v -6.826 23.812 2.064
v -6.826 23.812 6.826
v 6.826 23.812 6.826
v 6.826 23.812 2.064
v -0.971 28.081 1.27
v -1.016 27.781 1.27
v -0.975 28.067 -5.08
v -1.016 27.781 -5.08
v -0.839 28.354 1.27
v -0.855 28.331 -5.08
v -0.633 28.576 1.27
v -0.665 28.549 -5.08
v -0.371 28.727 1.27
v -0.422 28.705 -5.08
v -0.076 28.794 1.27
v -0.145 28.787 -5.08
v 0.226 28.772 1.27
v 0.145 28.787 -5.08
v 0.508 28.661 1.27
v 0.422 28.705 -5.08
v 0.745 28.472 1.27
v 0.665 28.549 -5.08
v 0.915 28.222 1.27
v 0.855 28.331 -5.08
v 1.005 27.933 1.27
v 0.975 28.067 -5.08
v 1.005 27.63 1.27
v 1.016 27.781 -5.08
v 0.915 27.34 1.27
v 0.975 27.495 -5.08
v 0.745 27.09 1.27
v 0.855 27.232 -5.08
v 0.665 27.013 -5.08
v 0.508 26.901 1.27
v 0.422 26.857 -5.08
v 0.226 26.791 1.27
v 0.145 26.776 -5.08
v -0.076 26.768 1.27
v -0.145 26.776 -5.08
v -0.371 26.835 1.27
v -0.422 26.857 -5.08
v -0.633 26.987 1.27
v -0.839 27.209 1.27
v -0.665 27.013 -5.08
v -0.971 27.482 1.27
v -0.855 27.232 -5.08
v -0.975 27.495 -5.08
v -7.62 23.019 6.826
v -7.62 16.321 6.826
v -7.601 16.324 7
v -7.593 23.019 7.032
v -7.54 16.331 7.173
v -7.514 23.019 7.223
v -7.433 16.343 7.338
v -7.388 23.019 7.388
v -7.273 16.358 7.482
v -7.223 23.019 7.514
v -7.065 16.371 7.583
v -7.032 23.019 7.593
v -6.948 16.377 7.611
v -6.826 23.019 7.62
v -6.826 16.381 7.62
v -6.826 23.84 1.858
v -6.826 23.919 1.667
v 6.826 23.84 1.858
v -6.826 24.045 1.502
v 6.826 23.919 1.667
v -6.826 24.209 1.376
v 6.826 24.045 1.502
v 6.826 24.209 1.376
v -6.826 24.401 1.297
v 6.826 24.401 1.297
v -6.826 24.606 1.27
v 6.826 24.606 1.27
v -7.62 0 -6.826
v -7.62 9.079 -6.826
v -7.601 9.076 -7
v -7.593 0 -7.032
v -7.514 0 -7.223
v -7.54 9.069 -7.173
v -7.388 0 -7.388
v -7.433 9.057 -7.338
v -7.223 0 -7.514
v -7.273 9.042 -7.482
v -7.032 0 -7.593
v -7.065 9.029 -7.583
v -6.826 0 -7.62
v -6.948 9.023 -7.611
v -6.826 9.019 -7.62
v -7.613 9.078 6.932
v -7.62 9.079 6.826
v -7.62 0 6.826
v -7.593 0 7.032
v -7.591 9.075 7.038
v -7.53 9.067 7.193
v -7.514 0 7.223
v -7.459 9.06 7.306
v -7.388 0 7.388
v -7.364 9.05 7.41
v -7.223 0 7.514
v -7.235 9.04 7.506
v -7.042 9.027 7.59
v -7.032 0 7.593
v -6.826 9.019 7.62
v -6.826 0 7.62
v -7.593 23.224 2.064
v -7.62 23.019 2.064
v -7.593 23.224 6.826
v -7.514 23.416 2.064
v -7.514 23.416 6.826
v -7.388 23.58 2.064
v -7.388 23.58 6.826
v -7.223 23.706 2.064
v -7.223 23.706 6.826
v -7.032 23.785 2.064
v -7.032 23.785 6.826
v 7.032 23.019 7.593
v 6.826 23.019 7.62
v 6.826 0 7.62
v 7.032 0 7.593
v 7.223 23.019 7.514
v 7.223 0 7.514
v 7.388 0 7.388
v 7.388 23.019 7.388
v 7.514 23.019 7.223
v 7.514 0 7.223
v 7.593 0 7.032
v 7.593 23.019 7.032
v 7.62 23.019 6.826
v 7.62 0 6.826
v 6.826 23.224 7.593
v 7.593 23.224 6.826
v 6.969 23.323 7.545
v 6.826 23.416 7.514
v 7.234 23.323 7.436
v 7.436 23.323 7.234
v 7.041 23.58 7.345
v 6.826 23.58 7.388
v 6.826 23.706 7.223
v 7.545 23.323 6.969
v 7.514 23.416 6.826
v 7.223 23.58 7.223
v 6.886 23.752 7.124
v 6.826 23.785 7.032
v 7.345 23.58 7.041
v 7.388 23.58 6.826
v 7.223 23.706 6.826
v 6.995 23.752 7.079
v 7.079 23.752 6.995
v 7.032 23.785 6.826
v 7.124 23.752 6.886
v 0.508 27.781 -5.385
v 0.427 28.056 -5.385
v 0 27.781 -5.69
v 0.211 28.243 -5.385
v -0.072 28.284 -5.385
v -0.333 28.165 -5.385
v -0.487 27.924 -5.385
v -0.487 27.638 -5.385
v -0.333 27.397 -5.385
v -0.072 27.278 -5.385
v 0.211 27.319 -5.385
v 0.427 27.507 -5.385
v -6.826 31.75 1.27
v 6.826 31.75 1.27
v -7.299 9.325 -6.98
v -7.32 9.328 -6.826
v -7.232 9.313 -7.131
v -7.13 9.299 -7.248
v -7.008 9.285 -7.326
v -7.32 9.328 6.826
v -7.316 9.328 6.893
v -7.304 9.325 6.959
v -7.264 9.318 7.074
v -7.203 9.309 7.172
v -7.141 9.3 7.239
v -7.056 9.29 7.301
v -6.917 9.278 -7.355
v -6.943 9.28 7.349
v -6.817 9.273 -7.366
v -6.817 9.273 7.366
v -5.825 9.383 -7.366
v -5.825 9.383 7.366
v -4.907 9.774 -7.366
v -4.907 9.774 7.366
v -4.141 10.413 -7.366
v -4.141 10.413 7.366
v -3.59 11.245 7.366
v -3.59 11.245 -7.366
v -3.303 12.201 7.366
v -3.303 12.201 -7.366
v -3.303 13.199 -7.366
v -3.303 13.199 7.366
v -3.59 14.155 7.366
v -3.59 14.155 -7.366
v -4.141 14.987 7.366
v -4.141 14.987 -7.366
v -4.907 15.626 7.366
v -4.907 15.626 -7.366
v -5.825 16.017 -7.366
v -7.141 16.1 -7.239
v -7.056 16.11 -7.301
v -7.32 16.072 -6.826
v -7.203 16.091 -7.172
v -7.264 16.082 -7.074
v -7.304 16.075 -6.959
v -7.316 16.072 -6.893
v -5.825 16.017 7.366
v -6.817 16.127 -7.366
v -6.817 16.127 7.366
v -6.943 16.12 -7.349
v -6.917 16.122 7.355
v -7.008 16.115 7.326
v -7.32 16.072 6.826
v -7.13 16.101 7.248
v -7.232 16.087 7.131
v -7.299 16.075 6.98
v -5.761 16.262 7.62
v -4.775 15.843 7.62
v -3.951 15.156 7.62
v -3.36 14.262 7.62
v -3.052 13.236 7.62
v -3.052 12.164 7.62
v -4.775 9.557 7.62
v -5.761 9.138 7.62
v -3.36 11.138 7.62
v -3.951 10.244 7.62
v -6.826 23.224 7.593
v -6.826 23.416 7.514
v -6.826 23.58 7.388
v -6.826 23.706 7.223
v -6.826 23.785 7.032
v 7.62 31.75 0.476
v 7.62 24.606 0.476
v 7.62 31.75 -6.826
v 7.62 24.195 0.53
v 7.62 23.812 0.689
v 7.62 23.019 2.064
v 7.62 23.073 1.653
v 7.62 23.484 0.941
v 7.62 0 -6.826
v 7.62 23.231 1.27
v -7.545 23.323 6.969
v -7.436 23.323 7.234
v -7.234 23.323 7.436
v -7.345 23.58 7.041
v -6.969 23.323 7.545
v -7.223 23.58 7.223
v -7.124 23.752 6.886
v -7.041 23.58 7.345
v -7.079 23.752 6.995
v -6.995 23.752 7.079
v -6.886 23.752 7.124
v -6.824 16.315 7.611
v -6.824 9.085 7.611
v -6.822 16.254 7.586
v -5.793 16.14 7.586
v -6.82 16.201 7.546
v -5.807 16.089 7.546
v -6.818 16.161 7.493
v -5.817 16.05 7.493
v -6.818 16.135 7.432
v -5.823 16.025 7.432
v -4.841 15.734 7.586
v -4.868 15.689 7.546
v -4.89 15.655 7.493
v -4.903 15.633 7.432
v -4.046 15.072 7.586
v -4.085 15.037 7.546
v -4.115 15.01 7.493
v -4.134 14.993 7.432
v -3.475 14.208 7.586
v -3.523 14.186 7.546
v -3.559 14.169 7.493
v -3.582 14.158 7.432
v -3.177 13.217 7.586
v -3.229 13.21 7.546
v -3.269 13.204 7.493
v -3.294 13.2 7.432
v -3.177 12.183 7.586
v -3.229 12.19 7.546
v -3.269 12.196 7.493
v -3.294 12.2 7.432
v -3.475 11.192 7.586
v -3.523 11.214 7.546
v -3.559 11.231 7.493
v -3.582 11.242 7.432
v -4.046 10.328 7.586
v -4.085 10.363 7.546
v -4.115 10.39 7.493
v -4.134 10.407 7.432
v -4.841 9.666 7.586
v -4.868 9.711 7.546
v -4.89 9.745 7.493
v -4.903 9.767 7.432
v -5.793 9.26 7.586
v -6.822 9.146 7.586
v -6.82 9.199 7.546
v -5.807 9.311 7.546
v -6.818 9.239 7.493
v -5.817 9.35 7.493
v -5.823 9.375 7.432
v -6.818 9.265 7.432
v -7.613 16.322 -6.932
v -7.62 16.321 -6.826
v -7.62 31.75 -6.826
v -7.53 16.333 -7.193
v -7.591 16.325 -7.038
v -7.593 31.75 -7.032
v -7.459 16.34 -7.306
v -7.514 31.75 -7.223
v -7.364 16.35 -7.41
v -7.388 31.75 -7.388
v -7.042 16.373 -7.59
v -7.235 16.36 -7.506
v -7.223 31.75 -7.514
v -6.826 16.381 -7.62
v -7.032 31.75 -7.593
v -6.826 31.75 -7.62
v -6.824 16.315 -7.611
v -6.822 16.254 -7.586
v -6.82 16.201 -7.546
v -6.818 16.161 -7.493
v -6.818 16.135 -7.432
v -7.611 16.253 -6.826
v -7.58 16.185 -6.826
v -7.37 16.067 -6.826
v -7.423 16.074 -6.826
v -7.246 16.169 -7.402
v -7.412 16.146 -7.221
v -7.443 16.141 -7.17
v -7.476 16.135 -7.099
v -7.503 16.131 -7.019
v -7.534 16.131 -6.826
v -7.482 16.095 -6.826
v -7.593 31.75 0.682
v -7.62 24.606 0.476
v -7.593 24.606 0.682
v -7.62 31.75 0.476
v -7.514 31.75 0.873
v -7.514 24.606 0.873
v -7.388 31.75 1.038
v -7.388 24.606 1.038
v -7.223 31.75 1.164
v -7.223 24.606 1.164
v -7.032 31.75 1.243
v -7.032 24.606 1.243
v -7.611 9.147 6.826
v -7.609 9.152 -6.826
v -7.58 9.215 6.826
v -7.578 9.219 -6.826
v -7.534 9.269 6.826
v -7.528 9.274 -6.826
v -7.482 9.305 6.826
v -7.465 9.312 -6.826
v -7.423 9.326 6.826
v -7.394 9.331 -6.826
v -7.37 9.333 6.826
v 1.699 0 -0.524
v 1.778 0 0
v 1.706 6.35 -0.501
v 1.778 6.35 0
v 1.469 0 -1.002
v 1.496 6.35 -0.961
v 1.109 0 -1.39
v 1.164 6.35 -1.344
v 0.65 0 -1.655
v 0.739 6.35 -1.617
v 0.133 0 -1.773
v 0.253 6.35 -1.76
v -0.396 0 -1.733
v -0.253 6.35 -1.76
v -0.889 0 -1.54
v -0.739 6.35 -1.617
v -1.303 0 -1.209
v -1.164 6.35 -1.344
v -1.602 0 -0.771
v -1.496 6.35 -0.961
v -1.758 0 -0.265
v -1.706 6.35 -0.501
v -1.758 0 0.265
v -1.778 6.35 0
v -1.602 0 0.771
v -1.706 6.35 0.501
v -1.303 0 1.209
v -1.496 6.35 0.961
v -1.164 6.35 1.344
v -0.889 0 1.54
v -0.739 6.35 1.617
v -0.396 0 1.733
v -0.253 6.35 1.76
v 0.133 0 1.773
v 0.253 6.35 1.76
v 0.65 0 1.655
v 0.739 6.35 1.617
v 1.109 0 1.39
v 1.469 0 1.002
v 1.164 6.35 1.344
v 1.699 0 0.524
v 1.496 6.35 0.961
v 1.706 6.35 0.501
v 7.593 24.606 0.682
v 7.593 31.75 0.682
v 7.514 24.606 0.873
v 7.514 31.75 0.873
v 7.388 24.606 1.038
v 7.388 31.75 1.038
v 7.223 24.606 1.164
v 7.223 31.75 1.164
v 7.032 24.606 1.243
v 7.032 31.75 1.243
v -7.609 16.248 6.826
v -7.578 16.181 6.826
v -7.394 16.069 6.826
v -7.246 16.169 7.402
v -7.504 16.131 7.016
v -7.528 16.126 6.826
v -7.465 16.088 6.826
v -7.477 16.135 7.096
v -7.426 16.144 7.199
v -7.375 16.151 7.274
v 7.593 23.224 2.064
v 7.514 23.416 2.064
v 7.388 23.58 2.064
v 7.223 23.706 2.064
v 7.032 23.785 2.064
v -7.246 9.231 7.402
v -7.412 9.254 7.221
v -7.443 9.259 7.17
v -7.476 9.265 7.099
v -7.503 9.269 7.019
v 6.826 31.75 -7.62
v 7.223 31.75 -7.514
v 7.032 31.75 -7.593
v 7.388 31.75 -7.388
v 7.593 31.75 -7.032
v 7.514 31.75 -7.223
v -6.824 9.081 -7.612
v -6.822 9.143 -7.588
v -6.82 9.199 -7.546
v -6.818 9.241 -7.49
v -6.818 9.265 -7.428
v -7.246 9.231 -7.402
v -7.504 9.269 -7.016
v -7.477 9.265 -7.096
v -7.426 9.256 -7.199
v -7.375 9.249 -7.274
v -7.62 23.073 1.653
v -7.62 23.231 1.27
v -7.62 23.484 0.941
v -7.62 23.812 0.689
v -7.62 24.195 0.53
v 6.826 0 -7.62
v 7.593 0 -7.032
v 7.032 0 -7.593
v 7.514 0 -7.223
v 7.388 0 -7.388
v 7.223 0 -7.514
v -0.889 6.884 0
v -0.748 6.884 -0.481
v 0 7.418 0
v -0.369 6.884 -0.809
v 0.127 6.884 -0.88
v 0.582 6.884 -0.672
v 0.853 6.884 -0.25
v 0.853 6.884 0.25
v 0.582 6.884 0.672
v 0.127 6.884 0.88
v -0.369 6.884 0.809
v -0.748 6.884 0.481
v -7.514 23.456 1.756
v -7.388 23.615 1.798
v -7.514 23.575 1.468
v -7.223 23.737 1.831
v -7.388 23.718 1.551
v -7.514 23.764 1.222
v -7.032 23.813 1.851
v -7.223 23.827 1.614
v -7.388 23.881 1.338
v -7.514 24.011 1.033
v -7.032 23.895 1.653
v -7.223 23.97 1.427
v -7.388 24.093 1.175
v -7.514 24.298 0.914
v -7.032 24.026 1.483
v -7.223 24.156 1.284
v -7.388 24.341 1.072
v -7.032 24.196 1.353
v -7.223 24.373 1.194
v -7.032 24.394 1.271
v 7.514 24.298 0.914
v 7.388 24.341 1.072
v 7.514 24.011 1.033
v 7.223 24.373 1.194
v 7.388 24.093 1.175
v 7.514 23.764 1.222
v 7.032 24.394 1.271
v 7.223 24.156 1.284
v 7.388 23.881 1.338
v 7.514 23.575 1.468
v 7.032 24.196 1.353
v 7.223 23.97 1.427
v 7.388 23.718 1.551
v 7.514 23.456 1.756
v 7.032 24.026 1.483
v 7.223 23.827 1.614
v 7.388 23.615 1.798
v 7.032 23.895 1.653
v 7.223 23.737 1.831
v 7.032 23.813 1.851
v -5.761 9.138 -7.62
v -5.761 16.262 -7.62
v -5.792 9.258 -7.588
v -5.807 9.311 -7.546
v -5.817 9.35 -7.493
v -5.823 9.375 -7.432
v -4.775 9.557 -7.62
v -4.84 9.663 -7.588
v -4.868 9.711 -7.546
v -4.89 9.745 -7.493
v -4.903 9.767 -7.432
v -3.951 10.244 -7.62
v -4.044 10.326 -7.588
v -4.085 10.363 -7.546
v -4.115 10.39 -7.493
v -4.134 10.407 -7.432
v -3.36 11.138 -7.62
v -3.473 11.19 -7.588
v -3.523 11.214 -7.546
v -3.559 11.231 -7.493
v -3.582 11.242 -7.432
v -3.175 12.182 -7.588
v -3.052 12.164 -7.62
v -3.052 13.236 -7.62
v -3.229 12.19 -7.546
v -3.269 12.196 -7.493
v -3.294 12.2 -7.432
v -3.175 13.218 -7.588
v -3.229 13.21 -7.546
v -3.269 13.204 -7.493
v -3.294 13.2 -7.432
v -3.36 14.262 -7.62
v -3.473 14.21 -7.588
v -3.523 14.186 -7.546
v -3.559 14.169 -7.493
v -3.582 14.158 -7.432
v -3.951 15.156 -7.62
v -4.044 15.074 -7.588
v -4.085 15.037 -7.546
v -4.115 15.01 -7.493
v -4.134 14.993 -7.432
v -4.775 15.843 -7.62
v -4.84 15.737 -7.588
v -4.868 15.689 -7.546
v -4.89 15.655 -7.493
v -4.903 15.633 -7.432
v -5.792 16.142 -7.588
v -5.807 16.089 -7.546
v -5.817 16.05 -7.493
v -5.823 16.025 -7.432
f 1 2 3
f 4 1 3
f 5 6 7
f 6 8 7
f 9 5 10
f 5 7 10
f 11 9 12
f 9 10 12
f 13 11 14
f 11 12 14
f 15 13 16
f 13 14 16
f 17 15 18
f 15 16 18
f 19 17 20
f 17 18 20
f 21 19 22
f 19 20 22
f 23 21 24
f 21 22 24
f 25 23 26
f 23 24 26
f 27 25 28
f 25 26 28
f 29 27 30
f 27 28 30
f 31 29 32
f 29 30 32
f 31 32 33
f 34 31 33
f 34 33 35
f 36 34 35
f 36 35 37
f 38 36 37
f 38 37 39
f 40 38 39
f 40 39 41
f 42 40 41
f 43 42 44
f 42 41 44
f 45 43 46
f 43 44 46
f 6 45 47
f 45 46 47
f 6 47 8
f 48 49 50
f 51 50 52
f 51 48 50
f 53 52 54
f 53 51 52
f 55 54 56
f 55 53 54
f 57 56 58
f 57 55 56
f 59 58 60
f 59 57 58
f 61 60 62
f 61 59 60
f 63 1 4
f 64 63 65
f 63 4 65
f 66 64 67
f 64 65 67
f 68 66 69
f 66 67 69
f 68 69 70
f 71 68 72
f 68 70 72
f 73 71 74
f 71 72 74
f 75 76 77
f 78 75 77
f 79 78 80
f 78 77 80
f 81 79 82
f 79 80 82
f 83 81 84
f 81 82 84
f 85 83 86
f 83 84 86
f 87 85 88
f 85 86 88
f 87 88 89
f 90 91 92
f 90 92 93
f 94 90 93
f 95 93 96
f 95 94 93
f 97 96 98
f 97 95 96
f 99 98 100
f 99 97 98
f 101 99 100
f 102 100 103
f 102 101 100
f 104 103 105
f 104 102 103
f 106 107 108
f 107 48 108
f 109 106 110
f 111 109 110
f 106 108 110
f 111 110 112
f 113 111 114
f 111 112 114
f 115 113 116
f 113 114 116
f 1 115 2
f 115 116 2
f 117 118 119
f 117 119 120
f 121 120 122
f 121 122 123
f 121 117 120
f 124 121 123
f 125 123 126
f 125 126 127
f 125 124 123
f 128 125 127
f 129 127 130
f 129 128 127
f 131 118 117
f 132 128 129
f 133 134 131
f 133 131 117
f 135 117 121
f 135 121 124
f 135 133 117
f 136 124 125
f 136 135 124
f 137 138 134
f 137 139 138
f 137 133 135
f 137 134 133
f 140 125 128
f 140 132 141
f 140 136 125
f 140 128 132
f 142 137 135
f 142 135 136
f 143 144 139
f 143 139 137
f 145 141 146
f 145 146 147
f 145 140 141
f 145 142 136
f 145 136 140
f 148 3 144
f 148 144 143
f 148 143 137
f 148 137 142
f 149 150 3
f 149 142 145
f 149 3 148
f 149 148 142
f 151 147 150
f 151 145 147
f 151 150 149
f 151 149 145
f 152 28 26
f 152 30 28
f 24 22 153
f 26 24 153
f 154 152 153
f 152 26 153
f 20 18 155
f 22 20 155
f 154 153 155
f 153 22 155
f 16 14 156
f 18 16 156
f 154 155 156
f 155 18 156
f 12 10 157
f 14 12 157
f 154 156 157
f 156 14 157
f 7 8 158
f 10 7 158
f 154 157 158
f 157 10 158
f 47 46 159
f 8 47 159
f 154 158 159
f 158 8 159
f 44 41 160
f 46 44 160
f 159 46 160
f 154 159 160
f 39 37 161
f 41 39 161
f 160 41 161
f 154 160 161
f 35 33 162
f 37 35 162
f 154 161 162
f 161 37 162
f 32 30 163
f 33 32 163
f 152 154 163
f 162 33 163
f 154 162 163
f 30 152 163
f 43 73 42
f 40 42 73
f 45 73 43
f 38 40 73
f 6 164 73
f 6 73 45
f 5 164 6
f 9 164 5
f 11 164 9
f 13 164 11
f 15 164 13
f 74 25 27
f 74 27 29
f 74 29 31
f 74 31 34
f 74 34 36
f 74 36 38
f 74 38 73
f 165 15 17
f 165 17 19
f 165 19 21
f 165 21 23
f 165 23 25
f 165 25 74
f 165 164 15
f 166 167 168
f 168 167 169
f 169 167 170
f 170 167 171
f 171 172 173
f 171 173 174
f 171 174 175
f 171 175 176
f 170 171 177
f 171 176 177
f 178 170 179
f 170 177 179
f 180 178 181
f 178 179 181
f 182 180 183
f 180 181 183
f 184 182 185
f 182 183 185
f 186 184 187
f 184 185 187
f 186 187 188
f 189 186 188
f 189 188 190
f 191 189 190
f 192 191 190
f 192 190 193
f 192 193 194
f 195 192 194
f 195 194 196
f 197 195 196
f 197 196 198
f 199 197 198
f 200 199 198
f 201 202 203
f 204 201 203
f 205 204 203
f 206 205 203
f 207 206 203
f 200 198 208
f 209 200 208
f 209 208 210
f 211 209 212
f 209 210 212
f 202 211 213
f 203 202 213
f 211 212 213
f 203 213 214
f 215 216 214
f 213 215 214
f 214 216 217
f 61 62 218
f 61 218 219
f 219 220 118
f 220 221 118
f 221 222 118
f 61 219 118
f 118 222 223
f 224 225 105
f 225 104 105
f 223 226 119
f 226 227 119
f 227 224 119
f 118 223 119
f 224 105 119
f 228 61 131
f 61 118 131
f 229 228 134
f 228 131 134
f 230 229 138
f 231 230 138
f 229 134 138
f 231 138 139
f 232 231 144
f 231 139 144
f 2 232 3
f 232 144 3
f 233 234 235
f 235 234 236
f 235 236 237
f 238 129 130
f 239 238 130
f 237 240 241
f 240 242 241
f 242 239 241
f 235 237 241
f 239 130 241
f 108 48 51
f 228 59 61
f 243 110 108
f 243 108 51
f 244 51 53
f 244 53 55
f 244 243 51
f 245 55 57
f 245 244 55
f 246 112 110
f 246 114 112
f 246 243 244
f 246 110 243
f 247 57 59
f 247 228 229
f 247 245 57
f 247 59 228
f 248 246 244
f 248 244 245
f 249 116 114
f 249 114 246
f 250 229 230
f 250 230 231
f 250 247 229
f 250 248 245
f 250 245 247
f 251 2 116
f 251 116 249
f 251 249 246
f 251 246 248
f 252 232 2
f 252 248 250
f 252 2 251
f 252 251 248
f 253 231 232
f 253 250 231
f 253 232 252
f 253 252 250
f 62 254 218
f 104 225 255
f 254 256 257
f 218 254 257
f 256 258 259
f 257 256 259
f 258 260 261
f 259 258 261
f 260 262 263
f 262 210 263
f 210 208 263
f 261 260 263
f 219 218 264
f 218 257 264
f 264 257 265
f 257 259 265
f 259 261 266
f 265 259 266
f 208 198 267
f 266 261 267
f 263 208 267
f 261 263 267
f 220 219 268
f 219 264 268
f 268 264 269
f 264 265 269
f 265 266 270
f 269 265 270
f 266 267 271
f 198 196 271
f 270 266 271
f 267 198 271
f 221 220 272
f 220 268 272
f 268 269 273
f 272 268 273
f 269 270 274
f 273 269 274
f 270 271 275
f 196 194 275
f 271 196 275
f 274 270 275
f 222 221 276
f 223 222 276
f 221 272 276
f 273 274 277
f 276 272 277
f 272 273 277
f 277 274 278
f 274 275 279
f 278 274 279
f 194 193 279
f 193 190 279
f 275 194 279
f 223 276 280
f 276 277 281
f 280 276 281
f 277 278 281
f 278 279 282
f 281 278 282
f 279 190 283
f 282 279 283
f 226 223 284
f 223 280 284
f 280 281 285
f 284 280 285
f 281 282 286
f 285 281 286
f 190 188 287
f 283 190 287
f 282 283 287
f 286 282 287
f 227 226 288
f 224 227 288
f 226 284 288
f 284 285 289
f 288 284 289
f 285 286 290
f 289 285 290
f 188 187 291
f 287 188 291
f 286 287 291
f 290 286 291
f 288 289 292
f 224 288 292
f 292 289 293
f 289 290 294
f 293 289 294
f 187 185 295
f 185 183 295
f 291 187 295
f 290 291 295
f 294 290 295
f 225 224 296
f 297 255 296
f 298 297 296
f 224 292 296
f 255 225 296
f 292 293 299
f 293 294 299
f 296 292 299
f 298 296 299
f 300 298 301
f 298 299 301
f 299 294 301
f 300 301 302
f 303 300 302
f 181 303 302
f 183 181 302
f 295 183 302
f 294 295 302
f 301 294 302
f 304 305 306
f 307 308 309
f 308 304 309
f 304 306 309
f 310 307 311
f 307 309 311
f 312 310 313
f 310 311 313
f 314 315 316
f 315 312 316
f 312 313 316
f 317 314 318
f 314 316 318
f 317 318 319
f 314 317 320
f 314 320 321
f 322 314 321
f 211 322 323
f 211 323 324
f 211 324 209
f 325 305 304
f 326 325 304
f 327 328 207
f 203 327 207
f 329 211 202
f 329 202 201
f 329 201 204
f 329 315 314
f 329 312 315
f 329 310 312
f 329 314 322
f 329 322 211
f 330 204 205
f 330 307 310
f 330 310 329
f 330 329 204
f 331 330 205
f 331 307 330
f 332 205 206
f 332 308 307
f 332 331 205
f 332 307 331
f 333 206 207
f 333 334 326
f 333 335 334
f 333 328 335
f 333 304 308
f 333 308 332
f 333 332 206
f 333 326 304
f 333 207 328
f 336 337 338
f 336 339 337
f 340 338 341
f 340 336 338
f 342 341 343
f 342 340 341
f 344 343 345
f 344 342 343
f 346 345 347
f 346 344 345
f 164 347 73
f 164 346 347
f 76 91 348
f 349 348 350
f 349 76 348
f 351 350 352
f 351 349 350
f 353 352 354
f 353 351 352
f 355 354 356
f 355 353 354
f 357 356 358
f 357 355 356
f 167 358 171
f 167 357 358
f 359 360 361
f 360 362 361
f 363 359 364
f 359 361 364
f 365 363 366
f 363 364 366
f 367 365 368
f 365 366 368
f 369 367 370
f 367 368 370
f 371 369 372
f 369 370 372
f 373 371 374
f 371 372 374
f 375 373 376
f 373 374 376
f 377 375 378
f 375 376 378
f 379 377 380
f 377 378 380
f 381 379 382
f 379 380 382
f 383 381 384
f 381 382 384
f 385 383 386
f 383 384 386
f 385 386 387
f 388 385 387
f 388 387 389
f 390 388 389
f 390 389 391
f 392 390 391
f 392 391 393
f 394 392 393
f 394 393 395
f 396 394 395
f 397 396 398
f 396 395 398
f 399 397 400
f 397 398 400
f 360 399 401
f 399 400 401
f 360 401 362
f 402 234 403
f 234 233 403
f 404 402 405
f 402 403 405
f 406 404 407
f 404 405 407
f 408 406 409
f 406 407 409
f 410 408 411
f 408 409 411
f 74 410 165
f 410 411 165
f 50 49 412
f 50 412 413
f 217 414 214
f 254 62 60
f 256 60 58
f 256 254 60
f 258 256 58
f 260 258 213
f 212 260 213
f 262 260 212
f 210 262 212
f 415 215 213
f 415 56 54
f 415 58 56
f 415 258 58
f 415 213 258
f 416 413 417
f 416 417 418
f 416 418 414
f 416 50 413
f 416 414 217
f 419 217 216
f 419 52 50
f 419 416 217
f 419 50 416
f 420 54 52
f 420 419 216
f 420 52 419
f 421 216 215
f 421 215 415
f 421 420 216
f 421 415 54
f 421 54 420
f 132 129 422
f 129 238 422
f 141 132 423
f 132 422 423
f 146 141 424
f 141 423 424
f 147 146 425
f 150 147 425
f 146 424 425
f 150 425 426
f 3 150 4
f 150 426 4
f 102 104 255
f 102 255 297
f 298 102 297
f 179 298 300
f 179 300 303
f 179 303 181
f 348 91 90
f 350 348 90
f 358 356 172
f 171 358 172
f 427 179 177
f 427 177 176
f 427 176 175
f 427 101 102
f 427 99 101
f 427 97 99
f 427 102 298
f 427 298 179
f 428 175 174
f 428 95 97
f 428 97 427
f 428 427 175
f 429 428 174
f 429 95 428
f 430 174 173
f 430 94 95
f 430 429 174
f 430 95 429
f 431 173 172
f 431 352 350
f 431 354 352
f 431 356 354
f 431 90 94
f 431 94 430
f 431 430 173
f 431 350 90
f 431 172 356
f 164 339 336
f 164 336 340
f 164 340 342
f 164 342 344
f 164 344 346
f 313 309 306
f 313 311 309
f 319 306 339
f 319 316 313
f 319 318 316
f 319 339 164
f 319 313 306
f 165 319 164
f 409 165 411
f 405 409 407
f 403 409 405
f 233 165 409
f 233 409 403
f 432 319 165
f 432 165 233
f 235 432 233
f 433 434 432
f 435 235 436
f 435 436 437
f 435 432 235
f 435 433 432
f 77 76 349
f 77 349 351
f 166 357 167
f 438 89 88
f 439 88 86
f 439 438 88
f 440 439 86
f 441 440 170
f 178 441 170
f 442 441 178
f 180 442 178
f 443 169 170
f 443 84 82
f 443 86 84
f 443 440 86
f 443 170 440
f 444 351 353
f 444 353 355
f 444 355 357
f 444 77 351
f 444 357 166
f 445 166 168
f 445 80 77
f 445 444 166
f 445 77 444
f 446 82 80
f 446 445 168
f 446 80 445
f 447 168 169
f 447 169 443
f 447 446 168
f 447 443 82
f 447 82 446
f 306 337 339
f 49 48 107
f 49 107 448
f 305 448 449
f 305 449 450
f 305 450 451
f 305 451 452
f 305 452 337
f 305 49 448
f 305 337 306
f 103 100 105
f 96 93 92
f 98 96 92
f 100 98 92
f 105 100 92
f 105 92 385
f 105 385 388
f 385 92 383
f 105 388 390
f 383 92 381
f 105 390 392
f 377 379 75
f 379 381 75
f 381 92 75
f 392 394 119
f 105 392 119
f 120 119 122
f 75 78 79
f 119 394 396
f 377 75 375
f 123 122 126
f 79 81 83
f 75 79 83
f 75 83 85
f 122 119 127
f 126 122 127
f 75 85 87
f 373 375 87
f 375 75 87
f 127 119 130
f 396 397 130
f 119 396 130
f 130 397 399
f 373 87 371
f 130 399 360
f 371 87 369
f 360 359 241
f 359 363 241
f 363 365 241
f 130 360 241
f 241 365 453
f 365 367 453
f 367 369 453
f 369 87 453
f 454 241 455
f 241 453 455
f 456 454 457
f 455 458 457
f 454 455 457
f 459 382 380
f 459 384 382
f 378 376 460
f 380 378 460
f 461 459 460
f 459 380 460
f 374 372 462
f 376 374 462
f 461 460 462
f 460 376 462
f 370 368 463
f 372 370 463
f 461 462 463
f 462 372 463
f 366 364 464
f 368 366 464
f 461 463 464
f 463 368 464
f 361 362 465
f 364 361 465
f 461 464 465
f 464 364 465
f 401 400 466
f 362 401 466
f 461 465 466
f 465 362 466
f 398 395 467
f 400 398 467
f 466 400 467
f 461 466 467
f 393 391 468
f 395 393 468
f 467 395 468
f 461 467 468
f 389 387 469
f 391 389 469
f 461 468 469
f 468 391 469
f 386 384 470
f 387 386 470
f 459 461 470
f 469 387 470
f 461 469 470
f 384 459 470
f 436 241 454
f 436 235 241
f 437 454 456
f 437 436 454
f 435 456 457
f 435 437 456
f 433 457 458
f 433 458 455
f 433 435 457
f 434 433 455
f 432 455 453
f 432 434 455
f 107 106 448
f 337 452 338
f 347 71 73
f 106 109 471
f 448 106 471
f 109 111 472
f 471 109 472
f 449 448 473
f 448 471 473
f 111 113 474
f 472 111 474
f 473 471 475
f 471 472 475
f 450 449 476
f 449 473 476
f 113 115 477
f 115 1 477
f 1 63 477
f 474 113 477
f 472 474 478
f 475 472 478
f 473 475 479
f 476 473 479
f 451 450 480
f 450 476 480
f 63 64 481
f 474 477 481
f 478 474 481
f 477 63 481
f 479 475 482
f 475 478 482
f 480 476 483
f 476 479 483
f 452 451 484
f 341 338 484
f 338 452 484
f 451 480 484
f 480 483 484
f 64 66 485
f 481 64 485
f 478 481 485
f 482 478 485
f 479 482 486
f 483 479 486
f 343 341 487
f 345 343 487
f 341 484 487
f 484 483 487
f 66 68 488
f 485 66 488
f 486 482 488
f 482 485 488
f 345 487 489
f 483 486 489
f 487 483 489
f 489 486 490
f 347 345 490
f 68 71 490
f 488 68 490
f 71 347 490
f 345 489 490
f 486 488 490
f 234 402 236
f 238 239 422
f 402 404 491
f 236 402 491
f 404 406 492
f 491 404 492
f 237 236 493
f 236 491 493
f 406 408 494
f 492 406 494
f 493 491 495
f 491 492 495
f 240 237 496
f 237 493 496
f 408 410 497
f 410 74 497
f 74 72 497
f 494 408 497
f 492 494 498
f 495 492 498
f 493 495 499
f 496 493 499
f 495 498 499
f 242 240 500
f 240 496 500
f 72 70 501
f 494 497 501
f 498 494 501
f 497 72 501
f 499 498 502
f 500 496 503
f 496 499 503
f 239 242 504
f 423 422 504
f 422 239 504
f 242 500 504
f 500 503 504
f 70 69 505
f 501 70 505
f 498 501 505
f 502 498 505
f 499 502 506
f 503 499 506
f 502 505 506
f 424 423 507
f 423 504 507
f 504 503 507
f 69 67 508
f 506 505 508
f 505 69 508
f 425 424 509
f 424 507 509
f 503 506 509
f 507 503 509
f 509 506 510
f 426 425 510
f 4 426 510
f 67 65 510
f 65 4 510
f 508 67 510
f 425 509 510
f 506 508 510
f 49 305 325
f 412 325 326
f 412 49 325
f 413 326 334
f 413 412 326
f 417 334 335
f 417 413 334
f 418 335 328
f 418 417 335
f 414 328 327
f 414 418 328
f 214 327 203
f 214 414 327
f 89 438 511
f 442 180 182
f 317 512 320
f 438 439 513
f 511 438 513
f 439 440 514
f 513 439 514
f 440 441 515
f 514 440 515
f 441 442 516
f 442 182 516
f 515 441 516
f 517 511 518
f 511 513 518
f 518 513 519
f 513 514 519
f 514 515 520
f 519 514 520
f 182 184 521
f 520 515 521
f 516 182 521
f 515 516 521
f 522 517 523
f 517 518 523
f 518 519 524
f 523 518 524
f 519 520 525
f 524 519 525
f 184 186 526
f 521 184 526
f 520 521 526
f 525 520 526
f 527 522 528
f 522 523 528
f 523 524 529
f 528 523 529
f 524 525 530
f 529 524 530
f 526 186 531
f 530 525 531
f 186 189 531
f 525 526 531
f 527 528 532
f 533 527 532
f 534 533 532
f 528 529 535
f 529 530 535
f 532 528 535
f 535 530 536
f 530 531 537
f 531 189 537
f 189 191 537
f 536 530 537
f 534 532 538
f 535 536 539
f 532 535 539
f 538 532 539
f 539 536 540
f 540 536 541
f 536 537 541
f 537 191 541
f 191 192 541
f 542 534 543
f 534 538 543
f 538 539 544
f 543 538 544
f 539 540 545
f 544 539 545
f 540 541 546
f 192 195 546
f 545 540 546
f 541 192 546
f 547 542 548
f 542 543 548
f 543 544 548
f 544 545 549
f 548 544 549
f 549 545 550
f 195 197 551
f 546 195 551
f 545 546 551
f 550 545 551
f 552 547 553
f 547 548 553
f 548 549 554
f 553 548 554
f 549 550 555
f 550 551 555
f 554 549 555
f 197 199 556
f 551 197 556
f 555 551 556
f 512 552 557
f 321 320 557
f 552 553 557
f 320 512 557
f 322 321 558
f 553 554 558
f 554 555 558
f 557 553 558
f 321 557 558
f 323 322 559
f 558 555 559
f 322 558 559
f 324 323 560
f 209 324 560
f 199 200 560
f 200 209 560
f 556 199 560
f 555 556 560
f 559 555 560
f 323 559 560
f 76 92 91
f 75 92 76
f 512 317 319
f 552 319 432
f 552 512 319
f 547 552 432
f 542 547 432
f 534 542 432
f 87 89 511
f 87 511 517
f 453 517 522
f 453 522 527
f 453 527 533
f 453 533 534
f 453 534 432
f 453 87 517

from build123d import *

# Parameters (mm, degrees)
SKETCH1_W                        = 15.24
SKETCH1_H                        = 15.24
BOSS_EXTRUDE1_DEPTH              = 31.75
FILLET1_R                        = 0.79375
CUT_EXTRUDE1_DEPTH               = 16.24
SKETCH2_3_W                      = 15.24
SKETCH2_3_H                      = 7.9375
CUT_EXTRUDE2_DEPTH               = 6.35
F_4_0_209_DIAMETER_HOLE1_D       = 2.032
F_4_0_209_DIAMETER_HOLE1_DEPTH   = 6.35
F_4_0_209_DIAMETER_HOLE1_TIP     = 0.610474389
F_10_0_1935_DIAMETER_HOLE1_D     = 3.556
F_10_0_1935_DIAMETER_HOLE1_DEPTH = 6.35
F_10_0_1935_DIAMETER_HOLE1_TIP   = 1.068330181
FILLET2_R                        = 0.79375
FILLET3_R                        = 0.254


with BuildPart() as part:
    # Sketch1 → Boss-Extrude1 (new body)
    with BuildSketch(Plane(origin=(0, 0, 0), x_dir=(1, 0, 0), z_dir=(0, 1, 0))):
        Rectangle(SKETCH1_W, SKETCH1_H)
    extrude(amount=BOSS_EXTRUDE1_DEPTH)

    # Fillet1
    fillet1_edges = [part.edges().sort_by_distance(p)[0] for p in [
        (7.62, 15.875, 7.62),
        (-7.62, 15.875, 7.62),
        (-7.62, 15.875, -7.62),
        (7.62, 15.875, -7.62),
    ]]
    fillet(fillet1_edges, radius=FILLET1_R)

    # Sketch2 → Cut-Extrude1 (cut, through all)
    with BuildSketch(Plane.XY.offset(7.62)):
        with BuildLine():
            ThreePointArc((-7.62, 9.398), (-3.266426044, 12.7), (-7.62, 16.002))
            Line((-7.62, 16.002), (-7.62, 9.398))
        make_face()
    extrude(amount=-CUT_EXTRUDE1_DEPTH, mode=Mode.SUBTRACT)

    # Sketch2<3> → Cut-Extrude2 (cut)
    with BuildSketch(Plane.XY.offset(7.62)):
        with Locations((0, 27.78125)):
            Rectangle(SKETCH2_3_W, SKETCH2_3_H)
    extrude(amount=-CUT_EXTRUDE2_DEPTH, mode=Mode.SUBTRACT)

    # #4 (0.209) Diameter Hole1
    with Locations(Plane.XY.offset(1.27)):
        with Locations((0, 27.78125)):
            Hole(F_4_0_209_DIAMETER_HOLE1_D / 2, depth=F_4_0_209_DIAMETER_HOLE1_DEPTH)
            with Locations((0, 0, -(F_4_0_209_DIAMETER_HOLE1_DEPTH + F_4_0_209_DIAMETER_HOLE1_TIP / 2))):  # 118° drill point
                Cone(0, F_4_0_209_DIAMETER_HOLE1_D / 2, F_4_0_209_DIAMETER_HOLE1_TIP, mode=Mode.SUBTRACT)

    # #10 (0.1935) Diameter Hole1
    with Locations(Plane(origin=(0, 0, 0), x_dir=(-1, 0, 0), z_dir=(0, -1, 0))):
        with Locations((0, 0)):
            Hole(F_10_0_1935_DIAMETER_HOLE1_D / 2, depth=F_10_0_1935_DIAMETER_HOLE1_DEPTH)
            with Locations((0, 0, -(F_10_0_1935_DIAMETER_HOLE1_DEPTH + F_10_0_1935_DIAMETER_HOLE1_TIP / 2))):  # 118° drill point
                Cone(0, F_10_0_1935_DIAMETER_HOLE1_D / 2, F_10_0_1935_DIAMETER_HOLE1_TIP, mode=Mode.SUBTRACT)

    # Fillet2
    fillet2_edges = [part.edges().sort_by_distance(p)[0] for p in [
        (-7.387516008, 23.8125, 7.387516008),
        (7.387516008, 23.8125, 7.387516008),
        (-7.62, 23.8125, 4.048125),
        (-7.62, 27.78125, 1.27),
        (0, 23.8125, 7.62),
        (0, 23.8125, 1.27),
        (7.62, 23.8125, 4.048125),
        (7.62, 27.78125, 1.27),
    ]]
    fillet(fillet2_edges, radius=FILLET2_R)

    # Fillet3
    fillet3_edges = [part.edges().sort_by_distance(p)[0] for p in [
        (-7.387203478, 16.058494452, 7.387828364),
        (-7.387203478, 9.341505548, 7.387828364),
        (-7.62, 9.398, 0),
        (-7.387203472, 9.341505547, -7.387828369),
        (-7.387203472, 16.058494453, -7.387828369),
        (-3.266426044, 12.7, -7.62),
        (-7.62, 16.002, 0),
        (-3.266426044, 12.7, 7.62),
    ]]
    fillet(fillet3_edges, radius=FILLET3_R)


solid = part.part
